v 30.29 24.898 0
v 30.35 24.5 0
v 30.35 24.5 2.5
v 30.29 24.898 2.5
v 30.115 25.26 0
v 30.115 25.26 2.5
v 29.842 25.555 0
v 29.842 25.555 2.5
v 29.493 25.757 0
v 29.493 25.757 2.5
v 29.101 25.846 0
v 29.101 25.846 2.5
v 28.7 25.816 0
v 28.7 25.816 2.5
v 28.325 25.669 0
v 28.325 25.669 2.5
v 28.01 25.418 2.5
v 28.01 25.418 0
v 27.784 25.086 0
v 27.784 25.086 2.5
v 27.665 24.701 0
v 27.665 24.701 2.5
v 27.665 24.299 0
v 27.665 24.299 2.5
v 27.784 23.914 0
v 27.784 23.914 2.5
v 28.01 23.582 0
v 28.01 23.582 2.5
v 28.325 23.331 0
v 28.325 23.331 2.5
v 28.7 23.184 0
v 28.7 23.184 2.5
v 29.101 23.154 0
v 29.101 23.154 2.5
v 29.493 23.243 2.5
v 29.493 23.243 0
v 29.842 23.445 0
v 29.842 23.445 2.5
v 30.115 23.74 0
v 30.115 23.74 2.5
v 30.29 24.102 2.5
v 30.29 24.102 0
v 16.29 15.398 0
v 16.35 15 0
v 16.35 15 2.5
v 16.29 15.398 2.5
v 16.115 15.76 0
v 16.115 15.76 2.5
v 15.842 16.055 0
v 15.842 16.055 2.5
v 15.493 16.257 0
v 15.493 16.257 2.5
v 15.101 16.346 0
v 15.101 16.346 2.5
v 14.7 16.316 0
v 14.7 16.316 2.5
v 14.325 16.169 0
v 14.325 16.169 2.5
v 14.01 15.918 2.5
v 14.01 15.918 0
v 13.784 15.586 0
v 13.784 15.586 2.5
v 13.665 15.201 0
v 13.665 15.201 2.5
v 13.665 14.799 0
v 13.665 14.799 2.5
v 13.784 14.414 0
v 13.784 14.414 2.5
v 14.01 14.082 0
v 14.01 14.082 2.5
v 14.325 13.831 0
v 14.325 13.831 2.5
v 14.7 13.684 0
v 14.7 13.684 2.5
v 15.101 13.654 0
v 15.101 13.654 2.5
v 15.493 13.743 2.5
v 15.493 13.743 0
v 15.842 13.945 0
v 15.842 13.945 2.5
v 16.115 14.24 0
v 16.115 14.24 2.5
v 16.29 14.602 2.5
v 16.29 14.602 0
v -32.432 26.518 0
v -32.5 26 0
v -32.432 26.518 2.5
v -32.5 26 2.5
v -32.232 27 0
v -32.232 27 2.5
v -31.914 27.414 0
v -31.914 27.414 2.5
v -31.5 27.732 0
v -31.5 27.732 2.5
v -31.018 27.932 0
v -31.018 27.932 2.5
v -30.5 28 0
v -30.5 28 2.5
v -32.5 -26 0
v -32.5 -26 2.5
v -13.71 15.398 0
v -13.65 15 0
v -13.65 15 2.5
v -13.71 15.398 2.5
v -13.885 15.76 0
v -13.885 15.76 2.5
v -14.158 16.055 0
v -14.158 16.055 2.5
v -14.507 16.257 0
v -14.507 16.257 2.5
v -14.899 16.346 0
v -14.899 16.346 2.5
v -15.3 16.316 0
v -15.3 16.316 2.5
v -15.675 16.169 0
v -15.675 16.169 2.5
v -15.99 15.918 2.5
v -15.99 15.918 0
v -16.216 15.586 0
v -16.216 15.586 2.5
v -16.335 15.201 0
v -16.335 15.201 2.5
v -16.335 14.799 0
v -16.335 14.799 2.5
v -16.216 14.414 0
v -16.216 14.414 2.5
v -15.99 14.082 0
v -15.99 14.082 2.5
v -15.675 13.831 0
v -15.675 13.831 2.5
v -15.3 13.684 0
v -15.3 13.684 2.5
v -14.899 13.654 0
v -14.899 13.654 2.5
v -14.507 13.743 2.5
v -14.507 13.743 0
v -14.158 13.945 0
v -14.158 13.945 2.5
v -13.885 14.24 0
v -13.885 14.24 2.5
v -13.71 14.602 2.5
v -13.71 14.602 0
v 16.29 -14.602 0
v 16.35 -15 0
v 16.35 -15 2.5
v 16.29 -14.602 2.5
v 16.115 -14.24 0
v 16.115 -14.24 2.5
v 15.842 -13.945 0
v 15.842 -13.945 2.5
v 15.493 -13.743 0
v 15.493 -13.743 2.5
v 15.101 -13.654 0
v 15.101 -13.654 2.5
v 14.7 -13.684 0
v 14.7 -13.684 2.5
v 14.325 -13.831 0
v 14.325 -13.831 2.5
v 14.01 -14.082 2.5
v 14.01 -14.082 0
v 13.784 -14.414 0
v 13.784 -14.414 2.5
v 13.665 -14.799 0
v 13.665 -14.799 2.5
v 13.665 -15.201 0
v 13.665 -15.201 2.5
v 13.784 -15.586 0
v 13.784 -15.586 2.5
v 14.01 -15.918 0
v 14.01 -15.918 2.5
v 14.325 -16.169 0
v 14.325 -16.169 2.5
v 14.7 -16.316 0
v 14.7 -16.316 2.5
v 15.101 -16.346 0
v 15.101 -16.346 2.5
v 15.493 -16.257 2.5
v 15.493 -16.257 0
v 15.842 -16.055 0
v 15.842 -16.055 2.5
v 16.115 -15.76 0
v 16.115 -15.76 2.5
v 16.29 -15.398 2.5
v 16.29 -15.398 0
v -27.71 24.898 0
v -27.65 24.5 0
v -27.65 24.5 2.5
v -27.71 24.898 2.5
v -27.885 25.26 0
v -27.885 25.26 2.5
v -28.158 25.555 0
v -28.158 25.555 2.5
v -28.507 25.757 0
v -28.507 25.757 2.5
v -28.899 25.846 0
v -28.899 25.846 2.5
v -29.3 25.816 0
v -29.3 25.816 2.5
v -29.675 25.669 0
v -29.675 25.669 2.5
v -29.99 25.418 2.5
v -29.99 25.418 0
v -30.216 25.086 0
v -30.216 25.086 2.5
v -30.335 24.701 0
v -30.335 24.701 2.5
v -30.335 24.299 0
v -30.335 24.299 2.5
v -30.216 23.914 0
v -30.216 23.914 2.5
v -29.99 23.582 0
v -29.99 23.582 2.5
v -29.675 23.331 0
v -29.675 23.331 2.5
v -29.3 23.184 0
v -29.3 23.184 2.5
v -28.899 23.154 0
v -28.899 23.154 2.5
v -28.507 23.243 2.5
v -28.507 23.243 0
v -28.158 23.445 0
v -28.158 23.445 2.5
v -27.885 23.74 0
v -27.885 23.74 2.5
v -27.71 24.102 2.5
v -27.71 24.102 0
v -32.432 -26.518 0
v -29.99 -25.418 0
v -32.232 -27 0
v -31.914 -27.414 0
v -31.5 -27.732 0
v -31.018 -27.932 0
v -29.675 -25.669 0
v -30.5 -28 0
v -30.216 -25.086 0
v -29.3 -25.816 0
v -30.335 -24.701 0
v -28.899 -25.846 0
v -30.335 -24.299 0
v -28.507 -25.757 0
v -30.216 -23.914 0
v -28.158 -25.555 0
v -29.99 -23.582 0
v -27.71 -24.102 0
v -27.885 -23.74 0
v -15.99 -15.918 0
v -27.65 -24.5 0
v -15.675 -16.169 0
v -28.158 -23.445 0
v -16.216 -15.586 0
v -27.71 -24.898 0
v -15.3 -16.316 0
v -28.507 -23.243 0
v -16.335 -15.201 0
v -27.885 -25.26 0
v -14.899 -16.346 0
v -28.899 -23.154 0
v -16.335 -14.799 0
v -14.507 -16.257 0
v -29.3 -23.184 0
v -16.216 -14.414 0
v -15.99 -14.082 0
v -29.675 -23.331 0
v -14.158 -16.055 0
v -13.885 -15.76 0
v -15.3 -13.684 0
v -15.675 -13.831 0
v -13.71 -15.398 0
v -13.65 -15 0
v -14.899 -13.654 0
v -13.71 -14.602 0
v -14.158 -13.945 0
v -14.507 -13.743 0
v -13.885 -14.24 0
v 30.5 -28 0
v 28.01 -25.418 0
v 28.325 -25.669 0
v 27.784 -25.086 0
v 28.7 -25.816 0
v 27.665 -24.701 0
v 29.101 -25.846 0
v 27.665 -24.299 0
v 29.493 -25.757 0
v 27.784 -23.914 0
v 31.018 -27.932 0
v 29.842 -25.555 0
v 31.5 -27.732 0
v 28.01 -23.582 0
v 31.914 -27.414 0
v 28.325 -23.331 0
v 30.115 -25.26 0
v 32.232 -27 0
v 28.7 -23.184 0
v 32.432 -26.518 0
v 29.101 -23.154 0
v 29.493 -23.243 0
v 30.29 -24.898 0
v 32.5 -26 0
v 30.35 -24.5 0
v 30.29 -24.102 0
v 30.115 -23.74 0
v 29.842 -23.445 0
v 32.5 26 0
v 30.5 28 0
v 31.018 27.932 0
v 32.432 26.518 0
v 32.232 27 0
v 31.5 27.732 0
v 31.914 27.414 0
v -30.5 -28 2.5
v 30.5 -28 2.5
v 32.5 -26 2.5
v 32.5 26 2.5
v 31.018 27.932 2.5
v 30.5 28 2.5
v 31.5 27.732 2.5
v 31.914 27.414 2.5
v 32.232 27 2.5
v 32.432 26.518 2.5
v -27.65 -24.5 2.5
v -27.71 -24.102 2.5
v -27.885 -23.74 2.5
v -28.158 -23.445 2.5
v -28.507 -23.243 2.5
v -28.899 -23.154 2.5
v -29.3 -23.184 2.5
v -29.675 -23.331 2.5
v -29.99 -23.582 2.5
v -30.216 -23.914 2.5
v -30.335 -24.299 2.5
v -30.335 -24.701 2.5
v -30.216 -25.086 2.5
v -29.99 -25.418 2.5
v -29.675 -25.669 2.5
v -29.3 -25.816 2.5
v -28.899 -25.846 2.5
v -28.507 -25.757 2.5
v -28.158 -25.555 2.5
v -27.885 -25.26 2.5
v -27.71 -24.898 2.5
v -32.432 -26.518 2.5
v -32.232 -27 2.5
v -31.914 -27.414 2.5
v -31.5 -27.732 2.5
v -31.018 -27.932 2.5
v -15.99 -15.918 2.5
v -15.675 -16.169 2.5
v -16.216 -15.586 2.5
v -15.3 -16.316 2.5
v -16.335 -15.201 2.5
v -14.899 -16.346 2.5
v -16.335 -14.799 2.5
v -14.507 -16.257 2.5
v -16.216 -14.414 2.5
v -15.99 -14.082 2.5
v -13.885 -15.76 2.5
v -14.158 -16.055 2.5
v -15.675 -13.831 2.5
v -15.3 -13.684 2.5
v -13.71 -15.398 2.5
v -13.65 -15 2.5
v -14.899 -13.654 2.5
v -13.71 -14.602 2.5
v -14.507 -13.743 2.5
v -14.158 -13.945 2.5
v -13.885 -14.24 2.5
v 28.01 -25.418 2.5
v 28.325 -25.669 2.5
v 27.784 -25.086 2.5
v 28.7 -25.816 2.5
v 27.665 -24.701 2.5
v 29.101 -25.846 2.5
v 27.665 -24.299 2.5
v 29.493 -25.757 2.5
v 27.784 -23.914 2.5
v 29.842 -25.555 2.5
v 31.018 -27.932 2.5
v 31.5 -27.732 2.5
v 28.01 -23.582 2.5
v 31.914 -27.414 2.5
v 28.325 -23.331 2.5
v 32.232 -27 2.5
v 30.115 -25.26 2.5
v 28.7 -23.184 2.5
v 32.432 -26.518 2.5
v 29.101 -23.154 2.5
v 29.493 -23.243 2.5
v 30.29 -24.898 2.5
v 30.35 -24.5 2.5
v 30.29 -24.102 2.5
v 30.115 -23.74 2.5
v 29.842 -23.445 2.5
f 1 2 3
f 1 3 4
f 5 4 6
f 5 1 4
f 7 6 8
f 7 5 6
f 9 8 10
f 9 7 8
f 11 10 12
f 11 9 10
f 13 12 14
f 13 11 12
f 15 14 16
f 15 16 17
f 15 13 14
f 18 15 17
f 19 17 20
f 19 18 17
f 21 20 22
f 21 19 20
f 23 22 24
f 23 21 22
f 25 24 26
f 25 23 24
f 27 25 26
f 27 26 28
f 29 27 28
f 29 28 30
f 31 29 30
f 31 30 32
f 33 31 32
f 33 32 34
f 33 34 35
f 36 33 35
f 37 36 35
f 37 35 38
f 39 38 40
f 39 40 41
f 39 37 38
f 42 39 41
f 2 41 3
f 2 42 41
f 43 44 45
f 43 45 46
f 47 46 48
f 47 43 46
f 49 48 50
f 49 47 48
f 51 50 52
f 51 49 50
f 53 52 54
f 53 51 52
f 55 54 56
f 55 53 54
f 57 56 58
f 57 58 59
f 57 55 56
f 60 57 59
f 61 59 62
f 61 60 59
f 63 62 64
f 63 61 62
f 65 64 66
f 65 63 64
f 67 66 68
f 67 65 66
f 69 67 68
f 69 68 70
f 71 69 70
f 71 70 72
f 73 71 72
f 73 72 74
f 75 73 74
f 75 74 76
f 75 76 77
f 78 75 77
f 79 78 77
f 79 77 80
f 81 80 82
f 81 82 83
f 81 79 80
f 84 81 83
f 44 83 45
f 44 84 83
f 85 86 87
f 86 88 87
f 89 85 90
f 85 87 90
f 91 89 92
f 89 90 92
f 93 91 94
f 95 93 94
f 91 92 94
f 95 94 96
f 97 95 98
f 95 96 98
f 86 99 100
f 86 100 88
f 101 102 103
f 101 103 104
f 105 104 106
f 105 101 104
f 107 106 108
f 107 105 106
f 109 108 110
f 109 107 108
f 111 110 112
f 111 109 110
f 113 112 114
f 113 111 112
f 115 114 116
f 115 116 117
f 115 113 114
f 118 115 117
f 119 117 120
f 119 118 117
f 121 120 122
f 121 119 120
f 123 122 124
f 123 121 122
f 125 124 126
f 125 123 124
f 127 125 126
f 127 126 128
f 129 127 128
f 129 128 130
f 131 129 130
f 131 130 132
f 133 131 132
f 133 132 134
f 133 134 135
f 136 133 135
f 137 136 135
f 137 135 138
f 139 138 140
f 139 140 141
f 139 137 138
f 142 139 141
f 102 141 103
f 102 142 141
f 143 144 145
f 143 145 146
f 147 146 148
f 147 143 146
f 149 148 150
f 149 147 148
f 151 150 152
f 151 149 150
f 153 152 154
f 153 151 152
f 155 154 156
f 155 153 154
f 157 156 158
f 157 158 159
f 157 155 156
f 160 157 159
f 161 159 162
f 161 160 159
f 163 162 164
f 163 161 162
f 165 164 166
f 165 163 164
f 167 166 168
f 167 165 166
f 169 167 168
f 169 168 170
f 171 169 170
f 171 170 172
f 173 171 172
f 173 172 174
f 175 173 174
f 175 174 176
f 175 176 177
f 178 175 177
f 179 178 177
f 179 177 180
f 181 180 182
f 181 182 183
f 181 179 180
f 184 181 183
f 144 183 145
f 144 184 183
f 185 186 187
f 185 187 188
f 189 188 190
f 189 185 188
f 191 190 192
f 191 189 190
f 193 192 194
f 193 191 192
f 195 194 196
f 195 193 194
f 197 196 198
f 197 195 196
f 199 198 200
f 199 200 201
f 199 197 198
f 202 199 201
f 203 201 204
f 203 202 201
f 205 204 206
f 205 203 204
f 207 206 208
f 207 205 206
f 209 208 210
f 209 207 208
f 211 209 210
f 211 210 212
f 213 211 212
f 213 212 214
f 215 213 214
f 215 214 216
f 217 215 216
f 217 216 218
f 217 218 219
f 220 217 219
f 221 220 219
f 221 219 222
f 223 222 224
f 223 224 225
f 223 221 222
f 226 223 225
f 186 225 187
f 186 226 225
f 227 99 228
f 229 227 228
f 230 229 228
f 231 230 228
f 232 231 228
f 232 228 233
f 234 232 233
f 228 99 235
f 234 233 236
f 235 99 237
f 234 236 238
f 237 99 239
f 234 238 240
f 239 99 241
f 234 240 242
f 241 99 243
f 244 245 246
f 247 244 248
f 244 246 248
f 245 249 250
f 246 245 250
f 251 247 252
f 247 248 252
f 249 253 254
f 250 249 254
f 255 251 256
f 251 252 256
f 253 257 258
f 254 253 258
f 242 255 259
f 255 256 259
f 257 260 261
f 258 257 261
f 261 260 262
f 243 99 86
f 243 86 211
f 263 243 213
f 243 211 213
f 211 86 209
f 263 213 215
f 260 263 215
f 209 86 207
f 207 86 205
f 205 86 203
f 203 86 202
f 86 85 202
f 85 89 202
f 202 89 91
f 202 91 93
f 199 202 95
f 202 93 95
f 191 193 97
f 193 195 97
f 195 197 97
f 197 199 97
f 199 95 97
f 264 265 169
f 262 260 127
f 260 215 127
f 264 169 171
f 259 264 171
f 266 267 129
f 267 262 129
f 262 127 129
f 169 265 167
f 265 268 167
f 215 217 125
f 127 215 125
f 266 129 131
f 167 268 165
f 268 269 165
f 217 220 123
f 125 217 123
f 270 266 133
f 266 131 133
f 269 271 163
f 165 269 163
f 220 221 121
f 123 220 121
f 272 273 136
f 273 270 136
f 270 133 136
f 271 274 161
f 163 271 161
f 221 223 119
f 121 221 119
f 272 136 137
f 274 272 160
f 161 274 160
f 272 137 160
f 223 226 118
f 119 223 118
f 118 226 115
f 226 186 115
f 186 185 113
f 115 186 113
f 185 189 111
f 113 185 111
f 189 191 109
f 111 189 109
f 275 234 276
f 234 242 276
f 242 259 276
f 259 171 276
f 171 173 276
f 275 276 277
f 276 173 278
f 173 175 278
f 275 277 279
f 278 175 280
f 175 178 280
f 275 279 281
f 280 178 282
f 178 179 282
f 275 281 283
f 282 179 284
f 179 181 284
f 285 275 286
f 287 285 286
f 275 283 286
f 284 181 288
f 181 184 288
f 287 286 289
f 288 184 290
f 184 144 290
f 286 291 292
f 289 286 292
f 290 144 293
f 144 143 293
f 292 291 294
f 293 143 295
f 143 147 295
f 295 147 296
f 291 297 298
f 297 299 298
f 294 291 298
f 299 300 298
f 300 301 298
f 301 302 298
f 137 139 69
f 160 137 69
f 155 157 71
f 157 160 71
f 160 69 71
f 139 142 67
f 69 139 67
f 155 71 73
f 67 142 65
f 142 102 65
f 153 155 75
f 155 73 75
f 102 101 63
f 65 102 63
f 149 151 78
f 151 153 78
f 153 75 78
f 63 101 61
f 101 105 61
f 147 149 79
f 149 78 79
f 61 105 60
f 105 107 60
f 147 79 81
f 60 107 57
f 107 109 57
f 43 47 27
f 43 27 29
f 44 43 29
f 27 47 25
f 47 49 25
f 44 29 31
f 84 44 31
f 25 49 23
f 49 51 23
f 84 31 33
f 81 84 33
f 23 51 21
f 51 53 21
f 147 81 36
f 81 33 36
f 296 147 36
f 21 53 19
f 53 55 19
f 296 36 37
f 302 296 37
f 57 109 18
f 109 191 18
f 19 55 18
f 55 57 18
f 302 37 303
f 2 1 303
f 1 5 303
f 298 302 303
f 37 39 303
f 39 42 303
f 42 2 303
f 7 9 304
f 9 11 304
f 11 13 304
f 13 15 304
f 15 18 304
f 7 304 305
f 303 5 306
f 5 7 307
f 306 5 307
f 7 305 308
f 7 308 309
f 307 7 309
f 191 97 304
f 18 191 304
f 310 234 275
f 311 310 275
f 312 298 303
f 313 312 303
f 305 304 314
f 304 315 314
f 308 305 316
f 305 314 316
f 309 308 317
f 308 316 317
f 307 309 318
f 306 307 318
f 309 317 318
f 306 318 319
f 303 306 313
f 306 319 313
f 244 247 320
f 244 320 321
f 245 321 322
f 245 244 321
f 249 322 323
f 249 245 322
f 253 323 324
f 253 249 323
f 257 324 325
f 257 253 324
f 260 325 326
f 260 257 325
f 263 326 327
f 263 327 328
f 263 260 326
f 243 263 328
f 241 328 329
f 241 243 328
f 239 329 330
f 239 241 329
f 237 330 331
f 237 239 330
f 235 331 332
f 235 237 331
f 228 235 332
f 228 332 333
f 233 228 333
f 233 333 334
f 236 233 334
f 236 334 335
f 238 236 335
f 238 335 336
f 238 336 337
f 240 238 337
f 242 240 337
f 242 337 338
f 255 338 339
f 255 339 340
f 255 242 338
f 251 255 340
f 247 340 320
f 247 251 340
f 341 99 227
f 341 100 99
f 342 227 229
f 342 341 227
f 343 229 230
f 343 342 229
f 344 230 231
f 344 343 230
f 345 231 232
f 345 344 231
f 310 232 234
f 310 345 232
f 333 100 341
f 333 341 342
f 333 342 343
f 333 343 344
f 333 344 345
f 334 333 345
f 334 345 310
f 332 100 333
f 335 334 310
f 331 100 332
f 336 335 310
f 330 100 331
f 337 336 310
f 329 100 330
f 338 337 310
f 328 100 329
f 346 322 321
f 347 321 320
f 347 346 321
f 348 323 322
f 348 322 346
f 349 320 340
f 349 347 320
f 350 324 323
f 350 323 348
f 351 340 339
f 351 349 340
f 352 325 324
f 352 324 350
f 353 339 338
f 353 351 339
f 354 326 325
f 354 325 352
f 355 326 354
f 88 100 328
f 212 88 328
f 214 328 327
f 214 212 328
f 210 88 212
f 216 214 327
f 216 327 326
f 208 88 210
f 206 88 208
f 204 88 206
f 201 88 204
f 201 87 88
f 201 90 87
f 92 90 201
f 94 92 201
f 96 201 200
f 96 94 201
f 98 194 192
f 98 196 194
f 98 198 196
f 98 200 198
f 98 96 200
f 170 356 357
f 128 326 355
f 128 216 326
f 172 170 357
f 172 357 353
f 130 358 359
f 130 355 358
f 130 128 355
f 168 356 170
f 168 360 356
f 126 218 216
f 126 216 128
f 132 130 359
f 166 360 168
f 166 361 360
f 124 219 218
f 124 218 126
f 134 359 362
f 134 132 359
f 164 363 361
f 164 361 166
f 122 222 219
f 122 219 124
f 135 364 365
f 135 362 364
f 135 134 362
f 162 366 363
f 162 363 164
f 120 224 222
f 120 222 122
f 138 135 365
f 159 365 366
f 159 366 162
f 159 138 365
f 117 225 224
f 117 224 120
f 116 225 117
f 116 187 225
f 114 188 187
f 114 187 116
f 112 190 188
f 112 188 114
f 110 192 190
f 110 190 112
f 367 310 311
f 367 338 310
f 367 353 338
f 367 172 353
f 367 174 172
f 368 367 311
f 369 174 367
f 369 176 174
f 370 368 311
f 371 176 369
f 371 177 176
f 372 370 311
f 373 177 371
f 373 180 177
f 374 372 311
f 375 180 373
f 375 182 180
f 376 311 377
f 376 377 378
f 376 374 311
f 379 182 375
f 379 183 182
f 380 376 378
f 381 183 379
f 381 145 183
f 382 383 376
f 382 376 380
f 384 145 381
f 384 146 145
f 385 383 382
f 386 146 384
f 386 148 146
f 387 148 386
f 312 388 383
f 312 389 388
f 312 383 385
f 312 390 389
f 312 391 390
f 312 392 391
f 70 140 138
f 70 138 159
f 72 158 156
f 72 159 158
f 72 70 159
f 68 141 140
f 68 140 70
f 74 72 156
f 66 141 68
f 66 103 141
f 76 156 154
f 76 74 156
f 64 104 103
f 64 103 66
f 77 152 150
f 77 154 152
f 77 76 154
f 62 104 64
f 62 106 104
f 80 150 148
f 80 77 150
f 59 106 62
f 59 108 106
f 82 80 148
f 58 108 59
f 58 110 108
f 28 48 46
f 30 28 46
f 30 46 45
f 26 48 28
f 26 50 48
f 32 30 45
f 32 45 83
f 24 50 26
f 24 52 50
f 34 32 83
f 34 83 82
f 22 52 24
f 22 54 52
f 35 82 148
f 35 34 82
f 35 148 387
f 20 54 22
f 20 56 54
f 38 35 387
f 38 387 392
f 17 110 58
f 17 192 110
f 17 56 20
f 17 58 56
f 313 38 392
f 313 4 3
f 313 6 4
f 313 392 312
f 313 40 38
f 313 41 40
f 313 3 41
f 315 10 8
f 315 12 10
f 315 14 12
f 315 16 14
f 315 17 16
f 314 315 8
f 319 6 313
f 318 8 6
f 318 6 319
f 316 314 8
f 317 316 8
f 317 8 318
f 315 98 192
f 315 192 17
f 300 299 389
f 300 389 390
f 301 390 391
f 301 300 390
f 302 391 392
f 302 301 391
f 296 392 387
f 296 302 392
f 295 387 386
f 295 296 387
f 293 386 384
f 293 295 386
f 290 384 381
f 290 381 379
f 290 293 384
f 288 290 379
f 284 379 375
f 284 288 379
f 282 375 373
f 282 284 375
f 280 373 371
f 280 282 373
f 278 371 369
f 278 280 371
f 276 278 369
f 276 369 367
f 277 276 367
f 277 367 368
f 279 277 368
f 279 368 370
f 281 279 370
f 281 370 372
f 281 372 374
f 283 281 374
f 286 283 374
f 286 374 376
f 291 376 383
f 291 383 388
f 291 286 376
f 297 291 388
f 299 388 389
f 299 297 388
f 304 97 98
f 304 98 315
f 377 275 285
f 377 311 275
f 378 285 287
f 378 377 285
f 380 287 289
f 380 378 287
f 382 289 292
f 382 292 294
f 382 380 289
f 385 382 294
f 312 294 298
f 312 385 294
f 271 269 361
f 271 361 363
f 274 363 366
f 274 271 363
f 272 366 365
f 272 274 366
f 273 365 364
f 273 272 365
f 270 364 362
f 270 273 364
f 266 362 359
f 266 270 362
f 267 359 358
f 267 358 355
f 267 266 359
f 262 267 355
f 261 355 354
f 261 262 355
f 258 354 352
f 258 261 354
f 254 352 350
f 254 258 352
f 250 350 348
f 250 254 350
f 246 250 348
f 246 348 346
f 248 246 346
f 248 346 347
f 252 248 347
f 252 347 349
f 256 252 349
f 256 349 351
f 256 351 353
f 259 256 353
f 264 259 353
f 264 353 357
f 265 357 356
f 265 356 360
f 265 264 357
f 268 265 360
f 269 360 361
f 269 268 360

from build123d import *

# Parameters (mm, degrees)
SKETCH_W  = 65
SKETCH_H  = 56
SKETCH_R  = 1.35
PAD_DEPTH = 2.5
FILLET_R  = 2


with BuildPart() as part:
    # Sketch → Pad (new body)
    with BuildSketch(Plane.XY):
        Rectangle(SKETCH_W, SKETCH_H)
        with Locations((15, 15)):
            Circle(SKETCH_R, mode=Mode.SUBTRACT)
        with Locations((15, -15)):
            Circle(SKETCH_R, mode=Mode.SUBTRACT)
        with Locations((-15, -15)):
            Circle(SKETCH_R, mode=Mode.SUBTRACT)
        with Locations((-15, 15)):
            Circle(SKETCH_R, mode=Mode.SUBTRACT)
        with Locations((-29, 24.5)):
            Circle(SKETCH_R, mode=Mode.SUBTRACT)
        with Locations((29, 24.5)):
            Circle(SKETCH_R, mode=Mode.SUBTRACT)
        with Locations((29, -24.5)):
            Circle(SKETCH_R, mode=Mode.SUBTRACT)
        with Locations((-29, -24.5)):
            Circle(SKETCH_R, mode=Mode.SUBTRACT)
    extrude(amount=PAD_DEPTH)

    # Fillet
    fillet_edges = [part.edges().sort_by_distance(p)[0] for p in [
        (-32.5, -28, 1.25),
        (-32.5, 28, 1.25),
        (32.5, -28, 1.25),
        (32.5, 28, 1.25),
    ]]
    fillet(fillet_edges, radius=FILLET_R)


solid = part.part
